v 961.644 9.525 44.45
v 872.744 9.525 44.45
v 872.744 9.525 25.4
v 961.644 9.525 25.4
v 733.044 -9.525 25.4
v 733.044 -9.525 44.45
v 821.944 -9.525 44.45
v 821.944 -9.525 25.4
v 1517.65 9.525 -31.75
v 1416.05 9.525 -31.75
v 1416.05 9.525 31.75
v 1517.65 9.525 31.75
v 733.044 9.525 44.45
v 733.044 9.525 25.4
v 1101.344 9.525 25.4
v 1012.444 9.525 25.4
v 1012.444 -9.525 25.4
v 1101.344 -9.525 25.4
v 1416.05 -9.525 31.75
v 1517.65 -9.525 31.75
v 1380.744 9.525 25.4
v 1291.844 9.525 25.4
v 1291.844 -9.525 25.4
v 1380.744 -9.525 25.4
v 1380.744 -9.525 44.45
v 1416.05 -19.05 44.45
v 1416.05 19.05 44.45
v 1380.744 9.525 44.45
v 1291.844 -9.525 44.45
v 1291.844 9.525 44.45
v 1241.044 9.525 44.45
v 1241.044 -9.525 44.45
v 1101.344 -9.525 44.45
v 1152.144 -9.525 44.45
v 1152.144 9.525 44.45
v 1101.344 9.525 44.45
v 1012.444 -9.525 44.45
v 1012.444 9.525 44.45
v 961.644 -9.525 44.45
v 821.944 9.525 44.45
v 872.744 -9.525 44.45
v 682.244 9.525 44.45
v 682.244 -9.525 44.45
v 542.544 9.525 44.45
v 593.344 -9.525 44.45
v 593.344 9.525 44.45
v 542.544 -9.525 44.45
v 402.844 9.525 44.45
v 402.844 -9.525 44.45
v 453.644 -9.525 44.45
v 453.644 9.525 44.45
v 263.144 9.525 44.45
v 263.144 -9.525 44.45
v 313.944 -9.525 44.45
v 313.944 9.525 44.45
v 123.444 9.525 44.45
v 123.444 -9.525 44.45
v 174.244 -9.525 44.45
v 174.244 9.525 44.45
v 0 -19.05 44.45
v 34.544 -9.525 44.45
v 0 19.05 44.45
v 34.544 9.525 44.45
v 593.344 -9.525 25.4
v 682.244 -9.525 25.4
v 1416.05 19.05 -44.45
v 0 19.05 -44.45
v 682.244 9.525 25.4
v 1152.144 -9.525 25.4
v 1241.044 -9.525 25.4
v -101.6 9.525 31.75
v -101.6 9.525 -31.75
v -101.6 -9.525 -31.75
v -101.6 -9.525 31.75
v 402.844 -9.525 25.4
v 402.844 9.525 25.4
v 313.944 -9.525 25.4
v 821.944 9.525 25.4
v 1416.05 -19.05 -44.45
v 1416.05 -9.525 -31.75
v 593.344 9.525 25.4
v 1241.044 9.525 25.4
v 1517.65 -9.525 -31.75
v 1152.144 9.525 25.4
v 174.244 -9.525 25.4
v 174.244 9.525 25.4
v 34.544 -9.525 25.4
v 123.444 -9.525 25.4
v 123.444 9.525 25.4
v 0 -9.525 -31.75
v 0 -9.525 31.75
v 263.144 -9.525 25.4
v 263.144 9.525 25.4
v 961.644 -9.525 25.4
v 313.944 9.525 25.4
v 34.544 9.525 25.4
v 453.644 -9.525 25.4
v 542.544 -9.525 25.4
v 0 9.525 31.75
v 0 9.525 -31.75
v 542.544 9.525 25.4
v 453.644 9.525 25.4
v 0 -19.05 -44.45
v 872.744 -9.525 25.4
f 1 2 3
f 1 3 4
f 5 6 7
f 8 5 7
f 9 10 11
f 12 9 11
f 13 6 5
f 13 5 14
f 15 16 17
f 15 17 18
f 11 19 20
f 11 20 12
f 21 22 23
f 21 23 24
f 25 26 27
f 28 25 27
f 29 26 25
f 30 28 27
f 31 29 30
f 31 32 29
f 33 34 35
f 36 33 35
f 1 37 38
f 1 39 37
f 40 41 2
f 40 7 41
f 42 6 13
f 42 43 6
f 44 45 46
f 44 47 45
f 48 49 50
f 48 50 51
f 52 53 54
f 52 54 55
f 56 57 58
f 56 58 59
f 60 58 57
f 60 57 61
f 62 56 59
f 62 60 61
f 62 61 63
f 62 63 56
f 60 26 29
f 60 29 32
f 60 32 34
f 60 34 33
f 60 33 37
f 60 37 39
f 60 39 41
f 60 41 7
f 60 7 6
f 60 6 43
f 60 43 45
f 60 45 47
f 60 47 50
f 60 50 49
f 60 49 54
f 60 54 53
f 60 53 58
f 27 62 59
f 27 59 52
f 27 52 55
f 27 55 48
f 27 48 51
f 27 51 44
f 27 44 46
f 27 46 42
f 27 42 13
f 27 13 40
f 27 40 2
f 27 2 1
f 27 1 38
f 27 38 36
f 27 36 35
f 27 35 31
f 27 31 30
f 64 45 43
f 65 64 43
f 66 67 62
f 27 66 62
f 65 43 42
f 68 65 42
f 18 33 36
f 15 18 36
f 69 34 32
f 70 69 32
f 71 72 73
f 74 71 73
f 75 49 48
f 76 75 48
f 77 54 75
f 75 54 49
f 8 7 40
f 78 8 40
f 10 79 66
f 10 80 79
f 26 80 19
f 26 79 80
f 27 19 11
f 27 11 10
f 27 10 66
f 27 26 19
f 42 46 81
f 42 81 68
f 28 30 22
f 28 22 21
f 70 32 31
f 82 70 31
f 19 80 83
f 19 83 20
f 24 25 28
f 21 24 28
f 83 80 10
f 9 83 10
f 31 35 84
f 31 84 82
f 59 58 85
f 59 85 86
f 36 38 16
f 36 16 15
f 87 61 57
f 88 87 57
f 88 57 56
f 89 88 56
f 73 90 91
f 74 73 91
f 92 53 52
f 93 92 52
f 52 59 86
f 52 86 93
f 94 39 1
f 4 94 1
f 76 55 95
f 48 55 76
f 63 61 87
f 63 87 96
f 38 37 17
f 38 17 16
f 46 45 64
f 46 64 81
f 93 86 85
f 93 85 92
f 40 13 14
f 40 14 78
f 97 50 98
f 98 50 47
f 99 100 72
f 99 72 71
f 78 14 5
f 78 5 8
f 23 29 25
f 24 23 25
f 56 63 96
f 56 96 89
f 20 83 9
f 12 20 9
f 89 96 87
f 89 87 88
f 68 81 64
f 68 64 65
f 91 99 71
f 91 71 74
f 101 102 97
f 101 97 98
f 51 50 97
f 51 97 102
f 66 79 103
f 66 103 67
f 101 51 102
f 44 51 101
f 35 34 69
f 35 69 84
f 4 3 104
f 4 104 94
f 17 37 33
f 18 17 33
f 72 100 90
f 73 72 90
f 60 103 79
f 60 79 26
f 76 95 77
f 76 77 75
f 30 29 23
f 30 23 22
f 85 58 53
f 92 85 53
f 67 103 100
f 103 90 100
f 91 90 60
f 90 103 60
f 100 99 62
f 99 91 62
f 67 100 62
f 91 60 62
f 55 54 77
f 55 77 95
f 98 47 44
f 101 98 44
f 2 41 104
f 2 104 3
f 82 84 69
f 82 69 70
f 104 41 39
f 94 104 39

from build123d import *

# Parameters (mm, degrees)
F0_W     = 38.1
F0_H     = 88.9
F1_DEPTH = 1416.05
F2_W     = 19.05
F2_H     = 63.5
F3_DEPTH = 101.6
F4_W     = 19.05
F4_H     = 63.5
F5_DEPTH = 101.6
F6_W     = 88.9
F6_H     = 19.05
F7_DEPTH = 19.05


with BuildPart() as f1:
    # F0 (on Right) → F1 (new body)
    with BuildSketch(Plane.YZ):
        Rectangle(F0_W, F0_H)
    extrude(amount=F1_DEPTH)

    # F2 (on face) → F3 (join)
    with BuildSketch(Plane.YZ.offset(1416.05)):
        Rectangle(F2_W, F2_H)
    extrude(amount=F3_DEPTH)

    # F4 (on face) → F5 (join)
    with BuildSketch(Plane(origin=(0, 0, 0), x_dir=(0, -1, 0), z_dir=(-1, 0, 0))):
        Rectangle(F4_W, F4_H)
    extrude(amount=F5_DEPTH)

    # F6 (on face) → F7 (cut)
    with BuildSketch(Plane.XY.offset(44.45)):
        with Locations((78.994, 0)):
            Rectangle(F6_W, F6_H)
        with Locations((218.694, 0)):
            Rectangle(F6_W, F6_H)
        with Locations((358.394, 0)):
            Rectangle(F6_W, F6_H)
        with Locations((498.094, 0)):
            Rectangle(F6_W, F6_H)
        with Locations((637.794, 0)):
            Rectangle(F6_W, F6_H)
        with Locations((777.494, 0)):
            Rectangle(F6_W, F6_H)
        with Locations((917.194, 0)):
            Rectangle(F6_W, F6_H)
        with Locations((1056.894, 0)):
            Rectangle(F6_W, F6_H)
        with Locations((1196.594, 0)):
            Rectangle(F6_W, F6_H)
        with Locations((1336.294, 0)):
            Rectangle(F6_W, F6_H)
    extrude(amount=-F7_DEPTH, mode=Mode.SUBTRACT)


solid = f1.part
